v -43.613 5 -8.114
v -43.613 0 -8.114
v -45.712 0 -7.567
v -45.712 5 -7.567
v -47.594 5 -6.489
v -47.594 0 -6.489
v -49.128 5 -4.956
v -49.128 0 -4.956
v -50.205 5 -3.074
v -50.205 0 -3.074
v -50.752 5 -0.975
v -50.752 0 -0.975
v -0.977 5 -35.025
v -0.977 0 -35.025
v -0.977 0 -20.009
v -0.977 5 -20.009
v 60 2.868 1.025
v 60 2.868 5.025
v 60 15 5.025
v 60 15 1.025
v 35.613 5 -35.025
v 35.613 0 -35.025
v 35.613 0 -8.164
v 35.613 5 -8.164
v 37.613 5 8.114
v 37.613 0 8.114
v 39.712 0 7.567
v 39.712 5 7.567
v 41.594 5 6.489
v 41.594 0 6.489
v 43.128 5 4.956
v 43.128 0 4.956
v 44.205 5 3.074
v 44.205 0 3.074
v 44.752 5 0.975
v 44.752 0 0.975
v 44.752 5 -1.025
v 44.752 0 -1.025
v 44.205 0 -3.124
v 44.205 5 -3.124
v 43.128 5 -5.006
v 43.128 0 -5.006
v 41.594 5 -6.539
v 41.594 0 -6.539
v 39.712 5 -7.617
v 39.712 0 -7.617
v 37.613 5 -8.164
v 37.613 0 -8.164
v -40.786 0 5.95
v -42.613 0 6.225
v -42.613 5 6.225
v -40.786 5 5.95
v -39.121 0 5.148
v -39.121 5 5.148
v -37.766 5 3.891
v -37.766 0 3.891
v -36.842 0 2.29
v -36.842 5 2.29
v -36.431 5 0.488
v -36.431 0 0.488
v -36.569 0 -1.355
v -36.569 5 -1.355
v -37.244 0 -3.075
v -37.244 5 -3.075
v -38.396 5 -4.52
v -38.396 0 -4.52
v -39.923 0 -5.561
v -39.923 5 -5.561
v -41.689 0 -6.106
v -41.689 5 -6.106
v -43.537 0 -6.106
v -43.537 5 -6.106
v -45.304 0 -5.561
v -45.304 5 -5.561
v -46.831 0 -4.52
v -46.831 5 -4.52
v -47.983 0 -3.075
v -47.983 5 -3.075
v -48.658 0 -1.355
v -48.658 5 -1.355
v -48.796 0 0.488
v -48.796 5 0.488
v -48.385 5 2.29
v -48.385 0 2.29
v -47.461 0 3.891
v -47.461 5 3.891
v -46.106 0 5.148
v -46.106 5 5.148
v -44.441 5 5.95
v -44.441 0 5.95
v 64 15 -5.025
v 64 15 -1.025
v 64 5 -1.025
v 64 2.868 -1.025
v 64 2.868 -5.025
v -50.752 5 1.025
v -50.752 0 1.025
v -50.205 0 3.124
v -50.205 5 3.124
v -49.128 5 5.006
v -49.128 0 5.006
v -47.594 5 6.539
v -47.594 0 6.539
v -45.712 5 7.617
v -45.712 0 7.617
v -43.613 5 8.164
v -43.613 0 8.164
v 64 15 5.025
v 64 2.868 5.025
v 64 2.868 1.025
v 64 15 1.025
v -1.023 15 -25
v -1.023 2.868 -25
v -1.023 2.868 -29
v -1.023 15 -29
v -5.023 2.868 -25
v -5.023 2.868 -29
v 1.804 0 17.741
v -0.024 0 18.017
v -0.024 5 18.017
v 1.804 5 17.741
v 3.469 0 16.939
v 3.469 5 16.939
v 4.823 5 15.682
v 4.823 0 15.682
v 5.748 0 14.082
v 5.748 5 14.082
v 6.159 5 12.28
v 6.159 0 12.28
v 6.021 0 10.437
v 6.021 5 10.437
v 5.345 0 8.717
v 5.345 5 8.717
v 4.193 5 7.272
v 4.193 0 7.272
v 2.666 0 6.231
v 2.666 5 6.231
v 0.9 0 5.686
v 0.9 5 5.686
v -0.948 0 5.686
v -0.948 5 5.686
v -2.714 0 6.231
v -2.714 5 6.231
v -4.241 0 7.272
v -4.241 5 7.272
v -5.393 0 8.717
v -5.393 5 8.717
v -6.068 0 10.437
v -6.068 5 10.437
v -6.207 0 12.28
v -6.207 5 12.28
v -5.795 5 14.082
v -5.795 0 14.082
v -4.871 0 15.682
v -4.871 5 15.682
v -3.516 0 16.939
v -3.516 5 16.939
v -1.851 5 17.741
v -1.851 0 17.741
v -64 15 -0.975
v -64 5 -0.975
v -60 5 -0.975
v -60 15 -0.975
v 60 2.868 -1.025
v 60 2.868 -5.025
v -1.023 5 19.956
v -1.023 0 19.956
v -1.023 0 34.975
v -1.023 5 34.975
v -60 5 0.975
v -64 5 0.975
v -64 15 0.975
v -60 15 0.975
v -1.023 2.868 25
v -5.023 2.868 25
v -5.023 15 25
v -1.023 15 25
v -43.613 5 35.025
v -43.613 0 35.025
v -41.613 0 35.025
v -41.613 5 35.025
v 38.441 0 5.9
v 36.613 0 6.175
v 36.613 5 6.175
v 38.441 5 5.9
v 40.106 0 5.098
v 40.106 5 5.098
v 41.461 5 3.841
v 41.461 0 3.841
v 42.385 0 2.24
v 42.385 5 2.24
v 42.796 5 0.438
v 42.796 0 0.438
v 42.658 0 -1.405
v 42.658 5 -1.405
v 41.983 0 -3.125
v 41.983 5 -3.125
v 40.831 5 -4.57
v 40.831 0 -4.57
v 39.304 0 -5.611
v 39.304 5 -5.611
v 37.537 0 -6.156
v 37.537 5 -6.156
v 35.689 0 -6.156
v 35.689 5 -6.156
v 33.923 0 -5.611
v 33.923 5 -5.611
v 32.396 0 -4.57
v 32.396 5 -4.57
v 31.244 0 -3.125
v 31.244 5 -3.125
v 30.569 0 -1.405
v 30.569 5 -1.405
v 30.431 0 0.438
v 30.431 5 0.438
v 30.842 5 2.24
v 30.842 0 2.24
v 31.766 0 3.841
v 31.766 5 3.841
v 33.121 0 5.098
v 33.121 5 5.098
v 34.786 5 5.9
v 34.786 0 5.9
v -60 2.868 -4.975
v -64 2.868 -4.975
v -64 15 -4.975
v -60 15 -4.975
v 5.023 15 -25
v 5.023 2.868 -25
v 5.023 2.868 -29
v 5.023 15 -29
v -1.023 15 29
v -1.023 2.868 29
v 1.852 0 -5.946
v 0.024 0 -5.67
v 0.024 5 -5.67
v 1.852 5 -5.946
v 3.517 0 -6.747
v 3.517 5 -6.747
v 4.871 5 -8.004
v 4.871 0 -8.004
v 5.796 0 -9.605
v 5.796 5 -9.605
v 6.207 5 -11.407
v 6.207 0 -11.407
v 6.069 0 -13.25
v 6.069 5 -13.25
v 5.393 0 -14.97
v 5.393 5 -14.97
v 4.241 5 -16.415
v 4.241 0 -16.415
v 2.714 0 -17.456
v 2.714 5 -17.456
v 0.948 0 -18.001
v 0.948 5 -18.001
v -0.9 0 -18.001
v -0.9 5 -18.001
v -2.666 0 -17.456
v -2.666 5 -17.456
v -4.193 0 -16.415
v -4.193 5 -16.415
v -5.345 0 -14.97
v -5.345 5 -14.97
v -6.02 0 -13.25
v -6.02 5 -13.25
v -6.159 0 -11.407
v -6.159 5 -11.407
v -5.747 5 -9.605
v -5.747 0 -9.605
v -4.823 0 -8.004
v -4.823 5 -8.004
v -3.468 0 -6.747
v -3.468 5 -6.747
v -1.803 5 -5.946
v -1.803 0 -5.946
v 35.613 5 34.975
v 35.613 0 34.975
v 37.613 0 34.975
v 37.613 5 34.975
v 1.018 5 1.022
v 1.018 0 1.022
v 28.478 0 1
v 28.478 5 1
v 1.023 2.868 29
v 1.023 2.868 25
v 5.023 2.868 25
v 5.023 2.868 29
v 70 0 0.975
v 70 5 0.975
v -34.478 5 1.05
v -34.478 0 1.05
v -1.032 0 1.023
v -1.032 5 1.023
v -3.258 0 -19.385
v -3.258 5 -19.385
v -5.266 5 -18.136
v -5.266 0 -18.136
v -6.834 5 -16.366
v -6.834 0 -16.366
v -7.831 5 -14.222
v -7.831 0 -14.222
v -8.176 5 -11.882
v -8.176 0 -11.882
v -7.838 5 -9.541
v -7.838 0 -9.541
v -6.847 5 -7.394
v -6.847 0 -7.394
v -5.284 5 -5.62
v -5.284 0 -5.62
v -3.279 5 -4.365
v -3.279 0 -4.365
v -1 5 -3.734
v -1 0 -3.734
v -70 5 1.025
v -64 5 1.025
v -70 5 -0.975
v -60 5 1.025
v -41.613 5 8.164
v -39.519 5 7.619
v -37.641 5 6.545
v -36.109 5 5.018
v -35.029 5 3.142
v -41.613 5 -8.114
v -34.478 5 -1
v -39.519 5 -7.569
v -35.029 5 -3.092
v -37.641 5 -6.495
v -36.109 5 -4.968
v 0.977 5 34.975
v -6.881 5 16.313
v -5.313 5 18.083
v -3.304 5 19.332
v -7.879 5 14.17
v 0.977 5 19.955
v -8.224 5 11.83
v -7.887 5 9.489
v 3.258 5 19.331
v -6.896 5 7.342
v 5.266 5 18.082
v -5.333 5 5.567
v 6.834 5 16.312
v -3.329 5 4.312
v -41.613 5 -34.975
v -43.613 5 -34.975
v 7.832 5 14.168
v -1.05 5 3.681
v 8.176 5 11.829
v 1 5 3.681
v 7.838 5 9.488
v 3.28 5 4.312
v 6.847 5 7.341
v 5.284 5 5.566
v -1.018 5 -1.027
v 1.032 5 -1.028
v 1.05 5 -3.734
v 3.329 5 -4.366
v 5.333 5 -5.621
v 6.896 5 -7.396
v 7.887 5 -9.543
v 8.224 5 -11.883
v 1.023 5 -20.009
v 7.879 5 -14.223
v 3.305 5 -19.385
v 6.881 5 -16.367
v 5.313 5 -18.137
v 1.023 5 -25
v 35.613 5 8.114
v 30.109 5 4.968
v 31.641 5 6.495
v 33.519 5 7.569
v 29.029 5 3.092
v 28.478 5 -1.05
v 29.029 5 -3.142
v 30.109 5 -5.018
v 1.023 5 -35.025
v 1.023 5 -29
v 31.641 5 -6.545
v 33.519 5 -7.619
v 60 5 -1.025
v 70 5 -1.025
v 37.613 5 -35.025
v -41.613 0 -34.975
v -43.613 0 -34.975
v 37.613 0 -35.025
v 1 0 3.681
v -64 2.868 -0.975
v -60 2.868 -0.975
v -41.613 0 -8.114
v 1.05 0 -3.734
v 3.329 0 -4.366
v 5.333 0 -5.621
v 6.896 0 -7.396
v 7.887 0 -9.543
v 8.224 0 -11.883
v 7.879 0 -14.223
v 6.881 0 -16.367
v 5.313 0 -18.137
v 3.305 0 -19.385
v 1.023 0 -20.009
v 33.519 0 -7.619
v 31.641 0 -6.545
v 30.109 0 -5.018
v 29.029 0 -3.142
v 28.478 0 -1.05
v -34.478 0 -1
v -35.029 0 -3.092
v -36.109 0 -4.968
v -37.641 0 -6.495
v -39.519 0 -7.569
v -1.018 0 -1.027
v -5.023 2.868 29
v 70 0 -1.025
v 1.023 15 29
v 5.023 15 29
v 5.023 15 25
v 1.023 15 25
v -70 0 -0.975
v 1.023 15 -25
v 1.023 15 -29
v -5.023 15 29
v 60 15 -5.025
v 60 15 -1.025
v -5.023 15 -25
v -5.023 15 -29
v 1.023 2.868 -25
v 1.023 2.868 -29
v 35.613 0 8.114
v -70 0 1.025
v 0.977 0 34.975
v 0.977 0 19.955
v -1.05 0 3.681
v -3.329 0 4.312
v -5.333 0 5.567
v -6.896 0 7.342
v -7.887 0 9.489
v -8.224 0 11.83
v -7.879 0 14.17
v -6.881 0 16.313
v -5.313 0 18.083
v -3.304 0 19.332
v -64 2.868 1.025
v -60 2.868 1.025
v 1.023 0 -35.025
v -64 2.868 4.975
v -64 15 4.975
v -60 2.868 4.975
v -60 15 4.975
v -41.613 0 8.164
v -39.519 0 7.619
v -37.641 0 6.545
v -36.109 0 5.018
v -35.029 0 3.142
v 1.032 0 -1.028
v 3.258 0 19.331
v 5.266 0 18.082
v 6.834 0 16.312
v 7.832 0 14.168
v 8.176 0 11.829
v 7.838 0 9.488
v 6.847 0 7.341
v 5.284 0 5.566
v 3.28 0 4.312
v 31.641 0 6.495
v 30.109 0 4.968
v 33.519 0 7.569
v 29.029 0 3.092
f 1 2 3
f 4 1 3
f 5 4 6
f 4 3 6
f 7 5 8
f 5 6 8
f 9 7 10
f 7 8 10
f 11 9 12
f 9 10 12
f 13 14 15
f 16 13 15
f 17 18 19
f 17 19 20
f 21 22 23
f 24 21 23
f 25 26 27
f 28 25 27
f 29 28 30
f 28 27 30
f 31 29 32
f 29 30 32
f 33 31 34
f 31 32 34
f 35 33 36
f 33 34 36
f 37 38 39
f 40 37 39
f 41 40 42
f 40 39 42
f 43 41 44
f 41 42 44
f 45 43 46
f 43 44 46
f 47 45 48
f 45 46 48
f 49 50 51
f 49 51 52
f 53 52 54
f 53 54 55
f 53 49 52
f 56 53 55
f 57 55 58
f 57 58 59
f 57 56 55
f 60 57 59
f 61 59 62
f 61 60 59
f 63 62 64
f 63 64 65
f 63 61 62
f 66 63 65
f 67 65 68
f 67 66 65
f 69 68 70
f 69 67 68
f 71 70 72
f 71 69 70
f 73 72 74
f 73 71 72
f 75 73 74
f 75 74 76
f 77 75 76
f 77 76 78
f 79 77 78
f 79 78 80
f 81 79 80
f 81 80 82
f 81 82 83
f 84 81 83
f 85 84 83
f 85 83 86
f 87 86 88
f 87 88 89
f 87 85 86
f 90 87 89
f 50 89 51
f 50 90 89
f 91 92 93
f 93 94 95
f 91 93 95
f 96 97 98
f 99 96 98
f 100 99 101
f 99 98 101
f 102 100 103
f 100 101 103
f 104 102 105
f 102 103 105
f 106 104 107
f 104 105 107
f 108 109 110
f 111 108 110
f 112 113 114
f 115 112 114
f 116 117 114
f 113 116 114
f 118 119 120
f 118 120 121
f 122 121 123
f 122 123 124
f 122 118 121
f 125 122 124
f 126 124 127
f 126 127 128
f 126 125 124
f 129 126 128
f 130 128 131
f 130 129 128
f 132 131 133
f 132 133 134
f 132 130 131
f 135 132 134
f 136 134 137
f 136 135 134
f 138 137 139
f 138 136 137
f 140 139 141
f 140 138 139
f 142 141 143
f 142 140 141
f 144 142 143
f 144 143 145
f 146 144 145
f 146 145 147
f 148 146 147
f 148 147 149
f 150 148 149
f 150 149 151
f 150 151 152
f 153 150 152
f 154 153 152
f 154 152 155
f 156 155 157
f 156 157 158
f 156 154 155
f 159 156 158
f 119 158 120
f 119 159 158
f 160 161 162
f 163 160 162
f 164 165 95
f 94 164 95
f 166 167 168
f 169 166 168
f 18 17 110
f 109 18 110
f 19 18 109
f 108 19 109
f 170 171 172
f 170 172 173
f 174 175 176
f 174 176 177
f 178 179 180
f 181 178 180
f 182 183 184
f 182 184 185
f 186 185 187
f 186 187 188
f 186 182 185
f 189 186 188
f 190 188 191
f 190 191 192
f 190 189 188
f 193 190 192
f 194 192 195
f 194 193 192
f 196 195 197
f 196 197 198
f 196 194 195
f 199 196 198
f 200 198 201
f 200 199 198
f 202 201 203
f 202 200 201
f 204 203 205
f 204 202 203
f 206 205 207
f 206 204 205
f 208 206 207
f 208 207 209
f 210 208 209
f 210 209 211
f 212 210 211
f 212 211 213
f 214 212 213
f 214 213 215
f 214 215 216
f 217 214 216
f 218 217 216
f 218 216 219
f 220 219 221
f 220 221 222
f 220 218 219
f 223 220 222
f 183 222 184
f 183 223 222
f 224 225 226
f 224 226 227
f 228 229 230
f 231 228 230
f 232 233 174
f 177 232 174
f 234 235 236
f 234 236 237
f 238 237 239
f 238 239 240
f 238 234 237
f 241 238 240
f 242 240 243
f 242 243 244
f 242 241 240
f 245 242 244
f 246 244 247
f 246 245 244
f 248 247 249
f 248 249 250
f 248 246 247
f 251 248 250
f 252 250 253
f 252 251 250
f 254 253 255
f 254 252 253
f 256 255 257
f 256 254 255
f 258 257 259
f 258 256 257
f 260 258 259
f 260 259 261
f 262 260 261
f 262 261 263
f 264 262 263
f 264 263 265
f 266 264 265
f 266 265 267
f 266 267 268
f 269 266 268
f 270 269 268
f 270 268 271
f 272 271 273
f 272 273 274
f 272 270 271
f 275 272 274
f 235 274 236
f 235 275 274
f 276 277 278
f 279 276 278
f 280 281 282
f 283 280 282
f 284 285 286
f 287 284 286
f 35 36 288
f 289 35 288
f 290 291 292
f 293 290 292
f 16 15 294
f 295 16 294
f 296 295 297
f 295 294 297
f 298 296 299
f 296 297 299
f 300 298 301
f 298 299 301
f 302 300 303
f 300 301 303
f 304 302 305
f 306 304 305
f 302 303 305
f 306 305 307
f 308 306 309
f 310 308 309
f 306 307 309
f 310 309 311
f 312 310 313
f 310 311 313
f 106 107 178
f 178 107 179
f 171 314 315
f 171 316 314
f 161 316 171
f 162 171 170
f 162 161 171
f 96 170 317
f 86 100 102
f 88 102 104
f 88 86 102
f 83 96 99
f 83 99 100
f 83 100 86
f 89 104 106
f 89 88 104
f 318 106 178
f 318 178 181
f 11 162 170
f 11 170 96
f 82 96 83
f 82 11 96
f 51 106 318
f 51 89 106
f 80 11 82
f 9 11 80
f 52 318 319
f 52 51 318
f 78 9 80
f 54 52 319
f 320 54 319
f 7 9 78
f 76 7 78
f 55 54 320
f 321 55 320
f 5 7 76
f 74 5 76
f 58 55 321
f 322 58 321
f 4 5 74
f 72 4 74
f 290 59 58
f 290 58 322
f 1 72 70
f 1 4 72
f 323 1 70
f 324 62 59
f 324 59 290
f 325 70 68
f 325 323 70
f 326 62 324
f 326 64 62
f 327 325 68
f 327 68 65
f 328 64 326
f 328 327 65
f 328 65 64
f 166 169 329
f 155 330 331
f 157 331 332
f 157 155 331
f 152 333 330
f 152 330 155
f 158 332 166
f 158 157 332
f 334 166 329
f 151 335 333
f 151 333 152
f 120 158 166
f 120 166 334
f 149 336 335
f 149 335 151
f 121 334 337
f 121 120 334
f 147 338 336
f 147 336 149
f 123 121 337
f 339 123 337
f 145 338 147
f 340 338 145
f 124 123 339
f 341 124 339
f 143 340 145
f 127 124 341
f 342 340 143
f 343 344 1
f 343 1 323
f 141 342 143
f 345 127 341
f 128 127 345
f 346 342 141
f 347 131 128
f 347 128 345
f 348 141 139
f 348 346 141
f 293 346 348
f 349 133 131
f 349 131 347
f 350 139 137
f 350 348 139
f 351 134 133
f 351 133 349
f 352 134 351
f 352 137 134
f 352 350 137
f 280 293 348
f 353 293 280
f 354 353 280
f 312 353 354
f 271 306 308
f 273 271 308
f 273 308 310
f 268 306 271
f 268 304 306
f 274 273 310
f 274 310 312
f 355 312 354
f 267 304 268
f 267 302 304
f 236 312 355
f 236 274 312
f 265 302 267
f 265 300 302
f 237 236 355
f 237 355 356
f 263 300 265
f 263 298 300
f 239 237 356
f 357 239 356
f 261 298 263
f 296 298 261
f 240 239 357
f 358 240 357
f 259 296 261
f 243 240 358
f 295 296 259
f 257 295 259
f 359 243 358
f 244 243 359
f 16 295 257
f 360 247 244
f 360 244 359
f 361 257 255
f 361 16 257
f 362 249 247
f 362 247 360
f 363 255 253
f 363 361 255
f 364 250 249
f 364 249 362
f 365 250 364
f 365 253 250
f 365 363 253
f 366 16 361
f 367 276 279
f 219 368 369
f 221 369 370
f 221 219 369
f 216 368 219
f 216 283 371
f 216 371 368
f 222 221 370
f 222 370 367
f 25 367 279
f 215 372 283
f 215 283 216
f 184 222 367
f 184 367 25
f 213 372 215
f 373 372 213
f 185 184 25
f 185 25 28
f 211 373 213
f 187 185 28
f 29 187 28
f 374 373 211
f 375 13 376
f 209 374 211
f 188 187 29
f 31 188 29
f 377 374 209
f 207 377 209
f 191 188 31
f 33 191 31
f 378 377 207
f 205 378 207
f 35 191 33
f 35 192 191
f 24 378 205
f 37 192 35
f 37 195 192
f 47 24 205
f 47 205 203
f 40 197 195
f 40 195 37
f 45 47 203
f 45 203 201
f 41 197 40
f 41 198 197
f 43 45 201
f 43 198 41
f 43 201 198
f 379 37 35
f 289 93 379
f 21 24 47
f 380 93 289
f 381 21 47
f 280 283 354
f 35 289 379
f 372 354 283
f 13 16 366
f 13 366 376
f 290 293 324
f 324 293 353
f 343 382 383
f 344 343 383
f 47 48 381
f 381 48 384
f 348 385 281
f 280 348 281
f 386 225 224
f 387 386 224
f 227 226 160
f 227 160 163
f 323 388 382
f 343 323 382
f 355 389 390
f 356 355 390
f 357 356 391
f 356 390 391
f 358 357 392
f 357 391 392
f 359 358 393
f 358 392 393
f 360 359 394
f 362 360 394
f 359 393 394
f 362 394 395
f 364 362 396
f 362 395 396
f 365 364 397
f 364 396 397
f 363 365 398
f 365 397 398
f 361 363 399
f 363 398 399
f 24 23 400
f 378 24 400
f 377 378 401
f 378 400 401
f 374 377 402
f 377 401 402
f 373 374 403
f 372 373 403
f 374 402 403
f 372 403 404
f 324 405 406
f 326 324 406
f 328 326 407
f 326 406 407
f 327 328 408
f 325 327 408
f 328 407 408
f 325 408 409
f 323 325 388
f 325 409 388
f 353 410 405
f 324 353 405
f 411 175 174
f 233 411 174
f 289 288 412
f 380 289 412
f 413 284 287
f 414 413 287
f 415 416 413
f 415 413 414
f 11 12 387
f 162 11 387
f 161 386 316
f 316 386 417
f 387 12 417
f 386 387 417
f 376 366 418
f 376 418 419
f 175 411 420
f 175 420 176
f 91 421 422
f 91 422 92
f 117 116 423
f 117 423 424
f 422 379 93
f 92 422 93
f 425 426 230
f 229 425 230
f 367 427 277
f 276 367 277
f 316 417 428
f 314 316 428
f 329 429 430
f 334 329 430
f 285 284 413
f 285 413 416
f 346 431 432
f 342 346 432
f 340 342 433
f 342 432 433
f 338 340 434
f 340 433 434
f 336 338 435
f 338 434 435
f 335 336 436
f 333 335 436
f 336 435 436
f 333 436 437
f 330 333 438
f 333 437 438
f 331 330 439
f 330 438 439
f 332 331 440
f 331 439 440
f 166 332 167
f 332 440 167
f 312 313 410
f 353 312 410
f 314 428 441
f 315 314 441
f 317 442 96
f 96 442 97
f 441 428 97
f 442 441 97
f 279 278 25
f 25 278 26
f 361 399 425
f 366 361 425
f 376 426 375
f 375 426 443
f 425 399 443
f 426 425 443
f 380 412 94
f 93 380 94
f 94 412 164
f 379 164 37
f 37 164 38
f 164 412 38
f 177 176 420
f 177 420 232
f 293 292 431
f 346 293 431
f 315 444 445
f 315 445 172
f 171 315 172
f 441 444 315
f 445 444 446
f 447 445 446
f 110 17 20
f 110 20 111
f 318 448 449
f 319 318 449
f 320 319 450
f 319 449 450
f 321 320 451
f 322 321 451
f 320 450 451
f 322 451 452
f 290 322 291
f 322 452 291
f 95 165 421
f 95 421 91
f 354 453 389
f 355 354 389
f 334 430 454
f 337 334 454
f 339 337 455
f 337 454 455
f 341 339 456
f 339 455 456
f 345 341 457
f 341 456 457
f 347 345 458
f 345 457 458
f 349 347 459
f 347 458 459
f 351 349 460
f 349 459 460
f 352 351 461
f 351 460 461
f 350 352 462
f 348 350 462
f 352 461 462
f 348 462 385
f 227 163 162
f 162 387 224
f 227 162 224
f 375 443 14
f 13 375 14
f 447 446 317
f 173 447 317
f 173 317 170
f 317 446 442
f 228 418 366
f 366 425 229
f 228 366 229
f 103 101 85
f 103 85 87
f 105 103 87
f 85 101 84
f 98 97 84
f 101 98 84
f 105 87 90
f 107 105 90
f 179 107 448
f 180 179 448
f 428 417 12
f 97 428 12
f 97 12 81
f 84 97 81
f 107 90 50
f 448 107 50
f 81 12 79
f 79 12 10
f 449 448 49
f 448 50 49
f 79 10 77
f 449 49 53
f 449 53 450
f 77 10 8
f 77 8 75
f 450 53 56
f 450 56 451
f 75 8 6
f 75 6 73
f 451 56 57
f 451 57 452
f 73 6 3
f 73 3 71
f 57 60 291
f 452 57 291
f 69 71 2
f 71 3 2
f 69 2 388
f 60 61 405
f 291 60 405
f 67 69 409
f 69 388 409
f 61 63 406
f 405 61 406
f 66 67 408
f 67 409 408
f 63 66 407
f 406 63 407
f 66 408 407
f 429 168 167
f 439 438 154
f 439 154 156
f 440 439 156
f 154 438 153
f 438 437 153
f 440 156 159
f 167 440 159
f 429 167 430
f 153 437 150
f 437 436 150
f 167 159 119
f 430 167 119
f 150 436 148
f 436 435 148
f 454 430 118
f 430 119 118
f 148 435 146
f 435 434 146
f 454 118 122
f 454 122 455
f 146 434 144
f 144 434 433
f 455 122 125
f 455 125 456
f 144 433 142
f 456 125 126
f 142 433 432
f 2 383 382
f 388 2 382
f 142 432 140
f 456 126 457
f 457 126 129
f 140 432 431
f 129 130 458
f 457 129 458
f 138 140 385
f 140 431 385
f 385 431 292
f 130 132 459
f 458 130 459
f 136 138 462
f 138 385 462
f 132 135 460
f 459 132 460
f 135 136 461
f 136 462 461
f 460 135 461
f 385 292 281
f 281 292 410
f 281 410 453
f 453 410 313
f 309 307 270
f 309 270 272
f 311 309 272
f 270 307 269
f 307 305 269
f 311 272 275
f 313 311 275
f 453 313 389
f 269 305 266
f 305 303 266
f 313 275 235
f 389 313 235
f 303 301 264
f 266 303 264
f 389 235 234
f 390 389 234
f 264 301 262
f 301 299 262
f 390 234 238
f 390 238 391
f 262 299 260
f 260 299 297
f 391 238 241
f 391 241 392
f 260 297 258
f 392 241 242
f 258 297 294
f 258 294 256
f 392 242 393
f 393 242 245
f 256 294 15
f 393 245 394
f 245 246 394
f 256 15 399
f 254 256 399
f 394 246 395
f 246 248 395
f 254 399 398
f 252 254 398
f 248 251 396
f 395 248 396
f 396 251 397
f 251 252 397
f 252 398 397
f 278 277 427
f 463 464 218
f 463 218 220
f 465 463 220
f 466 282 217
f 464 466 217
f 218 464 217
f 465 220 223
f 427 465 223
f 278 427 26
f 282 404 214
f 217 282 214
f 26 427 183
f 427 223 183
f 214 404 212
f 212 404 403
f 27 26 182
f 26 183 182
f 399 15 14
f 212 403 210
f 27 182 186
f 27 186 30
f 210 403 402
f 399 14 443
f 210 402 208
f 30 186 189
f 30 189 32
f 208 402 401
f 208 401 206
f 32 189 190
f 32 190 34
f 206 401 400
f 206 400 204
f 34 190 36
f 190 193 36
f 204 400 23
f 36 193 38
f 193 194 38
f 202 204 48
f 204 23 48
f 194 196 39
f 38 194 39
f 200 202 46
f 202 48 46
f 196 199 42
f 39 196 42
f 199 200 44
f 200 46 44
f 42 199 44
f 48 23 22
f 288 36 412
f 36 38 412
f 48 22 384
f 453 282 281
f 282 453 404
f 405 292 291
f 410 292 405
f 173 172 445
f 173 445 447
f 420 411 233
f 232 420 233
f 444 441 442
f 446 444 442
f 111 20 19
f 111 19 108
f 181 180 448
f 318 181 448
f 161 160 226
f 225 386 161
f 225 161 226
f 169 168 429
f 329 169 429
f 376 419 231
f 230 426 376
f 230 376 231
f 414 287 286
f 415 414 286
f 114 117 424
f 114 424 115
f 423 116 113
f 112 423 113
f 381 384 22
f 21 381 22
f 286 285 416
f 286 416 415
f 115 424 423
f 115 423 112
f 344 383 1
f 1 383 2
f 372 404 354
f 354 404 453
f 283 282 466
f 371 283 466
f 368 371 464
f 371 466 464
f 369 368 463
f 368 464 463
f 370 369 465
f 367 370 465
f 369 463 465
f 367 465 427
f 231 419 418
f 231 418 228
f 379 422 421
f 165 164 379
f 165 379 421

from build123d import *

# Parameters (mm, degrees)
SKETCH2_R                = 6.2
BOSS_EXTRUDE1_DEPTH      = 5
BOSS_EXTRUDE2_DEPTH      = 10
BOSS_EXTRUDE2_DEPTH_BACK = 2.132247663
SKETCH4_W                = 4
SKETCH4_H                = 4


with BuildPart() as part:
    # Sketch2 → Boss-Extrude1 (new body)
    with BuildSketch(Plane(origin=(0, 0, 0), x_dir=(1, 0, 0), z_dir=(0, 1, 0))):
        with BuildLine():
            Line((1.018110987, -1.021808769), (28.477746067, -1))
            ThreePointArc((28.477746067, -1), (30.824069579, -5.782175759), (35.613431348, -8.11379598))
            Line((35.613431348, -8.11379598), (35.613431348, -34.975))
            Line((35.613431348, -34.975), (37.613431348, -34.975))
            Line((37.613431348, -34.975), (37.613431348, -8.11379598))
            ThreePointArc((37.613431348, -8.11379598), (42.411706954, -5.773275606), (44.752227328, -0.975))
            Line((44.752227328, -0.975), (70, -0.975))
            Line((70, -0.975), (70, 1.025))
            Line((70, 1.025), (44.752227328, 1.025))
            ThreePointArc((44.752227328, 1.025), (42.411706954, 5.823275606), (37.613431348, 8.16379598))
            Line((37.613431348, 8.16379598), (37.613431348, 35.025))
            Line((37.613431348, 35.025), (35.613431348, 35.025))
            Line((35.613431348, 35.025), (35.613431348, 8.16379598))
            ThreePointArc((35.613431348, 8.16379598), (30.824069579, 5.832175759), (28.477746067, 1.05))
            Line((28.477746067, 1.05), (1.031761634, 1.028202073))
            Line((1.031761634, 1.028202073), (1.049782331, 3.73449335))
            ThreePointArc((1.049782331, 3.73449335), (8.224089635, 11.883378989), (1.023413071, 20.008973088))
            Line((1.023413071, 20.008973088), (1.023413071, 35.025))
            Line((1.023413071, 35.025), (-0.976586929, 35.025))
            Line((-0.976586929, 35.025), (-0.976586929, 20.008804187))
            ThreePointArc((-0.976586929, 20.008804187), (-8.175890957, 11.881999168), (-1.000217662, 3.734321519))
            Line((-1.000217662, 3.734321519), (-1.018248057, 1.026573931))
            Line((-1.018248057, 1.026573931), (-34.477746067, 1))
            ThreePointArc((-34.477746067, 1), (-36.824069579, 5.782175759), (-41.613431348, 8.11379598))
            Line((-41.613431348, 8.11379598), (-41.613431348, 34.975))
            Line((-41.613431348, 34.975), (-43.613431348, 34.975))
            Line((-43.613431348, 34.975), (-43.613431348, 8.11379598))
            ThreePointArc((-43.613431348, 8.11379598), (-48.411706954, 5.773275606), (-50.752227328, 0.975))
            Line((-50.752227328, 0.975), (-70, 0.975))
            Line((-70, 0.975), (-70, -1.025))
            Line((-70, -1.025), (-50.752227328, -1.025))
            ThreePointArc((-50.752227328, -1.025), (-48.411706954, -5.823275606), (-43.613431348, -8.16379598))
            Line((-43.613431348, -8.16379598), (-43.613431348, -35.025))
            Line((-43.613431348, -35.025), (-41.613431348, -35.025))
            Line((-41.613431348, -35.025), (-41.613431348, -8.16379598))
            ThreePointArc((-41.613431348, -8.16379598), (-36.824069579, -5.832175759), (-34.477746067, -1.05))
            Line((-34.477746067, -1.05), (-1.031898703, -1.023436911))
            Line((-1.031898703, -1.023436911), (-1.049596092, -3.68117478))
            ThreePointArc((-1.049596092, -3.68117478), (-8.223903396, -11.830060419), (-1.023226832, -19.955654518))
            Line((-1.023226832, -19.955654518), (-1.023226832, -34.975))
            Line((-1.023226832, -34.975), (0.976773168, -34.975))
            Line((0.976773168, -34.975), (0.976773168, -19.955485617))
            ThreePointArc((0.976773168, -19.955485617), (8.176077196, -11.828680597), (1.000403901, -3.681002948))
            Line((1.000403901, -3.681002948), (1.018110987, -1.021808769))
        make_face()
        with Locations(Location((-42.613431348, -0.025, 0), (0, 0, 270))):
            Circle(SKETCH2_R, mode=Mode.SUBTRACT)
        with Locations(Location((0.024100398, 11.870092687, 0), (0, 0, 270))):
            Circle(SKETCH2_R, mode=Mode.SUBTRACT)
        with Locations(Location((36.613431348, 0.025, 0), (0, 0, 270))):
            Circle(SKETCH2_R, mode=Mode.SUBTRACT)
        with Locations(Location((-0.023914159, -11.816774117, 0), (0, 0, 270))):
            Circle(SKETCH2_R, mode=Mode.SUBTRACT)
    extrude(amount=BOSS_EXTRUDE1_DEPTH)

    # Sketch4 → Boss-Extrude2 (add, two sides: drawn at the far end of the back side and taken through both)
    with BuildSketch(Plane(origin=(0, 5, 0), x_dir=(1, 0, 0), z_dir=(0, 1, 0)).offset(-BOSS_EXTRUDE2_DEPTH_BACK)):
        with Locations((3.023413071, 27)):
            Rectangle(SKETCH4_W, SKETCH4_H)
        with Locations((-62, 2.975)):
            Rectangle(SKETCH4_W, SKETCH4_H)
        with Locations((62, 3.025)):
            Rectangle(SKETCH4_W, SKETCH4_H)
        with Locations((62, -3.025)):
            Rectangle(SKETCH4_W, SKETCH4_H)
        with Locations((-3.023413071, 27)):
            Rectangle(SKETCH4_W, SKETCH4_H)
        with Locations((3.023413071, -27)):
            Rectangle(SKETCH4_W, SKETCH4_H)
        with Locations((-3.023413071, -27)):
            Rectangle(SKETCH4_W, SKETCH4_H)
        with Locations((-62, -2.975)):
            Rectangle(SKETCH4_W, SKETCH4_H)
    extrude(amount=BOSS_EXTRUDE2_DEPTH + BOSS_EXTRUDE2_DEPTH_BACK)


with BuildPart() as boss_extrude2_piece_1:
    # of the separate pieces the step leaves, piece 1, a body of its own (boss_extrude2_pieces)
    add(part.part.solids().sort_by_distance((-34.477746067, 0, 1.05))[0])


with BuildPart() as boss_extrude2_piece_2:
    # of the separate pieces the step leaves, piece 2, a body of its own (boss_extrude2_pieces)
    add(part.part.solids().sort_by_distance((64, 15, 5.025))[0])


with BuildPart() as boss_extrude2_piece_3:
    # of the separate pieces the step leaves, piece 3, a body of its own (boss_extrude2_pieces)
    add(part.part.solids().sort_by_distance((-1.023413071, 15, 29))[0])


with BuildPart() as boss_extrude2_piece_4:
    # of the separate pieces the step leaves, piece 4, a body of its own (boss_extrude2_pieces)
    add(part.part.solids().sort_by_distance((-1.023413071, 15, -25))[0])


with BuildPart() as boss_extrude2_piece_5:
    # of the separate pieces the step leaves, piece 5, a body of its own (boss_extrude2_pieces)
    add(part.part.solids().sort_by_distance((1.023413071, 15, 25))[0])


solid = Compound([boss_extrude2_piece_1.part, boss_extrude2_piece_2.part, boss_extrude2_piece_3.part, boss_extrude2_piece_4.part, boss_extrude2_piece_5.part])
